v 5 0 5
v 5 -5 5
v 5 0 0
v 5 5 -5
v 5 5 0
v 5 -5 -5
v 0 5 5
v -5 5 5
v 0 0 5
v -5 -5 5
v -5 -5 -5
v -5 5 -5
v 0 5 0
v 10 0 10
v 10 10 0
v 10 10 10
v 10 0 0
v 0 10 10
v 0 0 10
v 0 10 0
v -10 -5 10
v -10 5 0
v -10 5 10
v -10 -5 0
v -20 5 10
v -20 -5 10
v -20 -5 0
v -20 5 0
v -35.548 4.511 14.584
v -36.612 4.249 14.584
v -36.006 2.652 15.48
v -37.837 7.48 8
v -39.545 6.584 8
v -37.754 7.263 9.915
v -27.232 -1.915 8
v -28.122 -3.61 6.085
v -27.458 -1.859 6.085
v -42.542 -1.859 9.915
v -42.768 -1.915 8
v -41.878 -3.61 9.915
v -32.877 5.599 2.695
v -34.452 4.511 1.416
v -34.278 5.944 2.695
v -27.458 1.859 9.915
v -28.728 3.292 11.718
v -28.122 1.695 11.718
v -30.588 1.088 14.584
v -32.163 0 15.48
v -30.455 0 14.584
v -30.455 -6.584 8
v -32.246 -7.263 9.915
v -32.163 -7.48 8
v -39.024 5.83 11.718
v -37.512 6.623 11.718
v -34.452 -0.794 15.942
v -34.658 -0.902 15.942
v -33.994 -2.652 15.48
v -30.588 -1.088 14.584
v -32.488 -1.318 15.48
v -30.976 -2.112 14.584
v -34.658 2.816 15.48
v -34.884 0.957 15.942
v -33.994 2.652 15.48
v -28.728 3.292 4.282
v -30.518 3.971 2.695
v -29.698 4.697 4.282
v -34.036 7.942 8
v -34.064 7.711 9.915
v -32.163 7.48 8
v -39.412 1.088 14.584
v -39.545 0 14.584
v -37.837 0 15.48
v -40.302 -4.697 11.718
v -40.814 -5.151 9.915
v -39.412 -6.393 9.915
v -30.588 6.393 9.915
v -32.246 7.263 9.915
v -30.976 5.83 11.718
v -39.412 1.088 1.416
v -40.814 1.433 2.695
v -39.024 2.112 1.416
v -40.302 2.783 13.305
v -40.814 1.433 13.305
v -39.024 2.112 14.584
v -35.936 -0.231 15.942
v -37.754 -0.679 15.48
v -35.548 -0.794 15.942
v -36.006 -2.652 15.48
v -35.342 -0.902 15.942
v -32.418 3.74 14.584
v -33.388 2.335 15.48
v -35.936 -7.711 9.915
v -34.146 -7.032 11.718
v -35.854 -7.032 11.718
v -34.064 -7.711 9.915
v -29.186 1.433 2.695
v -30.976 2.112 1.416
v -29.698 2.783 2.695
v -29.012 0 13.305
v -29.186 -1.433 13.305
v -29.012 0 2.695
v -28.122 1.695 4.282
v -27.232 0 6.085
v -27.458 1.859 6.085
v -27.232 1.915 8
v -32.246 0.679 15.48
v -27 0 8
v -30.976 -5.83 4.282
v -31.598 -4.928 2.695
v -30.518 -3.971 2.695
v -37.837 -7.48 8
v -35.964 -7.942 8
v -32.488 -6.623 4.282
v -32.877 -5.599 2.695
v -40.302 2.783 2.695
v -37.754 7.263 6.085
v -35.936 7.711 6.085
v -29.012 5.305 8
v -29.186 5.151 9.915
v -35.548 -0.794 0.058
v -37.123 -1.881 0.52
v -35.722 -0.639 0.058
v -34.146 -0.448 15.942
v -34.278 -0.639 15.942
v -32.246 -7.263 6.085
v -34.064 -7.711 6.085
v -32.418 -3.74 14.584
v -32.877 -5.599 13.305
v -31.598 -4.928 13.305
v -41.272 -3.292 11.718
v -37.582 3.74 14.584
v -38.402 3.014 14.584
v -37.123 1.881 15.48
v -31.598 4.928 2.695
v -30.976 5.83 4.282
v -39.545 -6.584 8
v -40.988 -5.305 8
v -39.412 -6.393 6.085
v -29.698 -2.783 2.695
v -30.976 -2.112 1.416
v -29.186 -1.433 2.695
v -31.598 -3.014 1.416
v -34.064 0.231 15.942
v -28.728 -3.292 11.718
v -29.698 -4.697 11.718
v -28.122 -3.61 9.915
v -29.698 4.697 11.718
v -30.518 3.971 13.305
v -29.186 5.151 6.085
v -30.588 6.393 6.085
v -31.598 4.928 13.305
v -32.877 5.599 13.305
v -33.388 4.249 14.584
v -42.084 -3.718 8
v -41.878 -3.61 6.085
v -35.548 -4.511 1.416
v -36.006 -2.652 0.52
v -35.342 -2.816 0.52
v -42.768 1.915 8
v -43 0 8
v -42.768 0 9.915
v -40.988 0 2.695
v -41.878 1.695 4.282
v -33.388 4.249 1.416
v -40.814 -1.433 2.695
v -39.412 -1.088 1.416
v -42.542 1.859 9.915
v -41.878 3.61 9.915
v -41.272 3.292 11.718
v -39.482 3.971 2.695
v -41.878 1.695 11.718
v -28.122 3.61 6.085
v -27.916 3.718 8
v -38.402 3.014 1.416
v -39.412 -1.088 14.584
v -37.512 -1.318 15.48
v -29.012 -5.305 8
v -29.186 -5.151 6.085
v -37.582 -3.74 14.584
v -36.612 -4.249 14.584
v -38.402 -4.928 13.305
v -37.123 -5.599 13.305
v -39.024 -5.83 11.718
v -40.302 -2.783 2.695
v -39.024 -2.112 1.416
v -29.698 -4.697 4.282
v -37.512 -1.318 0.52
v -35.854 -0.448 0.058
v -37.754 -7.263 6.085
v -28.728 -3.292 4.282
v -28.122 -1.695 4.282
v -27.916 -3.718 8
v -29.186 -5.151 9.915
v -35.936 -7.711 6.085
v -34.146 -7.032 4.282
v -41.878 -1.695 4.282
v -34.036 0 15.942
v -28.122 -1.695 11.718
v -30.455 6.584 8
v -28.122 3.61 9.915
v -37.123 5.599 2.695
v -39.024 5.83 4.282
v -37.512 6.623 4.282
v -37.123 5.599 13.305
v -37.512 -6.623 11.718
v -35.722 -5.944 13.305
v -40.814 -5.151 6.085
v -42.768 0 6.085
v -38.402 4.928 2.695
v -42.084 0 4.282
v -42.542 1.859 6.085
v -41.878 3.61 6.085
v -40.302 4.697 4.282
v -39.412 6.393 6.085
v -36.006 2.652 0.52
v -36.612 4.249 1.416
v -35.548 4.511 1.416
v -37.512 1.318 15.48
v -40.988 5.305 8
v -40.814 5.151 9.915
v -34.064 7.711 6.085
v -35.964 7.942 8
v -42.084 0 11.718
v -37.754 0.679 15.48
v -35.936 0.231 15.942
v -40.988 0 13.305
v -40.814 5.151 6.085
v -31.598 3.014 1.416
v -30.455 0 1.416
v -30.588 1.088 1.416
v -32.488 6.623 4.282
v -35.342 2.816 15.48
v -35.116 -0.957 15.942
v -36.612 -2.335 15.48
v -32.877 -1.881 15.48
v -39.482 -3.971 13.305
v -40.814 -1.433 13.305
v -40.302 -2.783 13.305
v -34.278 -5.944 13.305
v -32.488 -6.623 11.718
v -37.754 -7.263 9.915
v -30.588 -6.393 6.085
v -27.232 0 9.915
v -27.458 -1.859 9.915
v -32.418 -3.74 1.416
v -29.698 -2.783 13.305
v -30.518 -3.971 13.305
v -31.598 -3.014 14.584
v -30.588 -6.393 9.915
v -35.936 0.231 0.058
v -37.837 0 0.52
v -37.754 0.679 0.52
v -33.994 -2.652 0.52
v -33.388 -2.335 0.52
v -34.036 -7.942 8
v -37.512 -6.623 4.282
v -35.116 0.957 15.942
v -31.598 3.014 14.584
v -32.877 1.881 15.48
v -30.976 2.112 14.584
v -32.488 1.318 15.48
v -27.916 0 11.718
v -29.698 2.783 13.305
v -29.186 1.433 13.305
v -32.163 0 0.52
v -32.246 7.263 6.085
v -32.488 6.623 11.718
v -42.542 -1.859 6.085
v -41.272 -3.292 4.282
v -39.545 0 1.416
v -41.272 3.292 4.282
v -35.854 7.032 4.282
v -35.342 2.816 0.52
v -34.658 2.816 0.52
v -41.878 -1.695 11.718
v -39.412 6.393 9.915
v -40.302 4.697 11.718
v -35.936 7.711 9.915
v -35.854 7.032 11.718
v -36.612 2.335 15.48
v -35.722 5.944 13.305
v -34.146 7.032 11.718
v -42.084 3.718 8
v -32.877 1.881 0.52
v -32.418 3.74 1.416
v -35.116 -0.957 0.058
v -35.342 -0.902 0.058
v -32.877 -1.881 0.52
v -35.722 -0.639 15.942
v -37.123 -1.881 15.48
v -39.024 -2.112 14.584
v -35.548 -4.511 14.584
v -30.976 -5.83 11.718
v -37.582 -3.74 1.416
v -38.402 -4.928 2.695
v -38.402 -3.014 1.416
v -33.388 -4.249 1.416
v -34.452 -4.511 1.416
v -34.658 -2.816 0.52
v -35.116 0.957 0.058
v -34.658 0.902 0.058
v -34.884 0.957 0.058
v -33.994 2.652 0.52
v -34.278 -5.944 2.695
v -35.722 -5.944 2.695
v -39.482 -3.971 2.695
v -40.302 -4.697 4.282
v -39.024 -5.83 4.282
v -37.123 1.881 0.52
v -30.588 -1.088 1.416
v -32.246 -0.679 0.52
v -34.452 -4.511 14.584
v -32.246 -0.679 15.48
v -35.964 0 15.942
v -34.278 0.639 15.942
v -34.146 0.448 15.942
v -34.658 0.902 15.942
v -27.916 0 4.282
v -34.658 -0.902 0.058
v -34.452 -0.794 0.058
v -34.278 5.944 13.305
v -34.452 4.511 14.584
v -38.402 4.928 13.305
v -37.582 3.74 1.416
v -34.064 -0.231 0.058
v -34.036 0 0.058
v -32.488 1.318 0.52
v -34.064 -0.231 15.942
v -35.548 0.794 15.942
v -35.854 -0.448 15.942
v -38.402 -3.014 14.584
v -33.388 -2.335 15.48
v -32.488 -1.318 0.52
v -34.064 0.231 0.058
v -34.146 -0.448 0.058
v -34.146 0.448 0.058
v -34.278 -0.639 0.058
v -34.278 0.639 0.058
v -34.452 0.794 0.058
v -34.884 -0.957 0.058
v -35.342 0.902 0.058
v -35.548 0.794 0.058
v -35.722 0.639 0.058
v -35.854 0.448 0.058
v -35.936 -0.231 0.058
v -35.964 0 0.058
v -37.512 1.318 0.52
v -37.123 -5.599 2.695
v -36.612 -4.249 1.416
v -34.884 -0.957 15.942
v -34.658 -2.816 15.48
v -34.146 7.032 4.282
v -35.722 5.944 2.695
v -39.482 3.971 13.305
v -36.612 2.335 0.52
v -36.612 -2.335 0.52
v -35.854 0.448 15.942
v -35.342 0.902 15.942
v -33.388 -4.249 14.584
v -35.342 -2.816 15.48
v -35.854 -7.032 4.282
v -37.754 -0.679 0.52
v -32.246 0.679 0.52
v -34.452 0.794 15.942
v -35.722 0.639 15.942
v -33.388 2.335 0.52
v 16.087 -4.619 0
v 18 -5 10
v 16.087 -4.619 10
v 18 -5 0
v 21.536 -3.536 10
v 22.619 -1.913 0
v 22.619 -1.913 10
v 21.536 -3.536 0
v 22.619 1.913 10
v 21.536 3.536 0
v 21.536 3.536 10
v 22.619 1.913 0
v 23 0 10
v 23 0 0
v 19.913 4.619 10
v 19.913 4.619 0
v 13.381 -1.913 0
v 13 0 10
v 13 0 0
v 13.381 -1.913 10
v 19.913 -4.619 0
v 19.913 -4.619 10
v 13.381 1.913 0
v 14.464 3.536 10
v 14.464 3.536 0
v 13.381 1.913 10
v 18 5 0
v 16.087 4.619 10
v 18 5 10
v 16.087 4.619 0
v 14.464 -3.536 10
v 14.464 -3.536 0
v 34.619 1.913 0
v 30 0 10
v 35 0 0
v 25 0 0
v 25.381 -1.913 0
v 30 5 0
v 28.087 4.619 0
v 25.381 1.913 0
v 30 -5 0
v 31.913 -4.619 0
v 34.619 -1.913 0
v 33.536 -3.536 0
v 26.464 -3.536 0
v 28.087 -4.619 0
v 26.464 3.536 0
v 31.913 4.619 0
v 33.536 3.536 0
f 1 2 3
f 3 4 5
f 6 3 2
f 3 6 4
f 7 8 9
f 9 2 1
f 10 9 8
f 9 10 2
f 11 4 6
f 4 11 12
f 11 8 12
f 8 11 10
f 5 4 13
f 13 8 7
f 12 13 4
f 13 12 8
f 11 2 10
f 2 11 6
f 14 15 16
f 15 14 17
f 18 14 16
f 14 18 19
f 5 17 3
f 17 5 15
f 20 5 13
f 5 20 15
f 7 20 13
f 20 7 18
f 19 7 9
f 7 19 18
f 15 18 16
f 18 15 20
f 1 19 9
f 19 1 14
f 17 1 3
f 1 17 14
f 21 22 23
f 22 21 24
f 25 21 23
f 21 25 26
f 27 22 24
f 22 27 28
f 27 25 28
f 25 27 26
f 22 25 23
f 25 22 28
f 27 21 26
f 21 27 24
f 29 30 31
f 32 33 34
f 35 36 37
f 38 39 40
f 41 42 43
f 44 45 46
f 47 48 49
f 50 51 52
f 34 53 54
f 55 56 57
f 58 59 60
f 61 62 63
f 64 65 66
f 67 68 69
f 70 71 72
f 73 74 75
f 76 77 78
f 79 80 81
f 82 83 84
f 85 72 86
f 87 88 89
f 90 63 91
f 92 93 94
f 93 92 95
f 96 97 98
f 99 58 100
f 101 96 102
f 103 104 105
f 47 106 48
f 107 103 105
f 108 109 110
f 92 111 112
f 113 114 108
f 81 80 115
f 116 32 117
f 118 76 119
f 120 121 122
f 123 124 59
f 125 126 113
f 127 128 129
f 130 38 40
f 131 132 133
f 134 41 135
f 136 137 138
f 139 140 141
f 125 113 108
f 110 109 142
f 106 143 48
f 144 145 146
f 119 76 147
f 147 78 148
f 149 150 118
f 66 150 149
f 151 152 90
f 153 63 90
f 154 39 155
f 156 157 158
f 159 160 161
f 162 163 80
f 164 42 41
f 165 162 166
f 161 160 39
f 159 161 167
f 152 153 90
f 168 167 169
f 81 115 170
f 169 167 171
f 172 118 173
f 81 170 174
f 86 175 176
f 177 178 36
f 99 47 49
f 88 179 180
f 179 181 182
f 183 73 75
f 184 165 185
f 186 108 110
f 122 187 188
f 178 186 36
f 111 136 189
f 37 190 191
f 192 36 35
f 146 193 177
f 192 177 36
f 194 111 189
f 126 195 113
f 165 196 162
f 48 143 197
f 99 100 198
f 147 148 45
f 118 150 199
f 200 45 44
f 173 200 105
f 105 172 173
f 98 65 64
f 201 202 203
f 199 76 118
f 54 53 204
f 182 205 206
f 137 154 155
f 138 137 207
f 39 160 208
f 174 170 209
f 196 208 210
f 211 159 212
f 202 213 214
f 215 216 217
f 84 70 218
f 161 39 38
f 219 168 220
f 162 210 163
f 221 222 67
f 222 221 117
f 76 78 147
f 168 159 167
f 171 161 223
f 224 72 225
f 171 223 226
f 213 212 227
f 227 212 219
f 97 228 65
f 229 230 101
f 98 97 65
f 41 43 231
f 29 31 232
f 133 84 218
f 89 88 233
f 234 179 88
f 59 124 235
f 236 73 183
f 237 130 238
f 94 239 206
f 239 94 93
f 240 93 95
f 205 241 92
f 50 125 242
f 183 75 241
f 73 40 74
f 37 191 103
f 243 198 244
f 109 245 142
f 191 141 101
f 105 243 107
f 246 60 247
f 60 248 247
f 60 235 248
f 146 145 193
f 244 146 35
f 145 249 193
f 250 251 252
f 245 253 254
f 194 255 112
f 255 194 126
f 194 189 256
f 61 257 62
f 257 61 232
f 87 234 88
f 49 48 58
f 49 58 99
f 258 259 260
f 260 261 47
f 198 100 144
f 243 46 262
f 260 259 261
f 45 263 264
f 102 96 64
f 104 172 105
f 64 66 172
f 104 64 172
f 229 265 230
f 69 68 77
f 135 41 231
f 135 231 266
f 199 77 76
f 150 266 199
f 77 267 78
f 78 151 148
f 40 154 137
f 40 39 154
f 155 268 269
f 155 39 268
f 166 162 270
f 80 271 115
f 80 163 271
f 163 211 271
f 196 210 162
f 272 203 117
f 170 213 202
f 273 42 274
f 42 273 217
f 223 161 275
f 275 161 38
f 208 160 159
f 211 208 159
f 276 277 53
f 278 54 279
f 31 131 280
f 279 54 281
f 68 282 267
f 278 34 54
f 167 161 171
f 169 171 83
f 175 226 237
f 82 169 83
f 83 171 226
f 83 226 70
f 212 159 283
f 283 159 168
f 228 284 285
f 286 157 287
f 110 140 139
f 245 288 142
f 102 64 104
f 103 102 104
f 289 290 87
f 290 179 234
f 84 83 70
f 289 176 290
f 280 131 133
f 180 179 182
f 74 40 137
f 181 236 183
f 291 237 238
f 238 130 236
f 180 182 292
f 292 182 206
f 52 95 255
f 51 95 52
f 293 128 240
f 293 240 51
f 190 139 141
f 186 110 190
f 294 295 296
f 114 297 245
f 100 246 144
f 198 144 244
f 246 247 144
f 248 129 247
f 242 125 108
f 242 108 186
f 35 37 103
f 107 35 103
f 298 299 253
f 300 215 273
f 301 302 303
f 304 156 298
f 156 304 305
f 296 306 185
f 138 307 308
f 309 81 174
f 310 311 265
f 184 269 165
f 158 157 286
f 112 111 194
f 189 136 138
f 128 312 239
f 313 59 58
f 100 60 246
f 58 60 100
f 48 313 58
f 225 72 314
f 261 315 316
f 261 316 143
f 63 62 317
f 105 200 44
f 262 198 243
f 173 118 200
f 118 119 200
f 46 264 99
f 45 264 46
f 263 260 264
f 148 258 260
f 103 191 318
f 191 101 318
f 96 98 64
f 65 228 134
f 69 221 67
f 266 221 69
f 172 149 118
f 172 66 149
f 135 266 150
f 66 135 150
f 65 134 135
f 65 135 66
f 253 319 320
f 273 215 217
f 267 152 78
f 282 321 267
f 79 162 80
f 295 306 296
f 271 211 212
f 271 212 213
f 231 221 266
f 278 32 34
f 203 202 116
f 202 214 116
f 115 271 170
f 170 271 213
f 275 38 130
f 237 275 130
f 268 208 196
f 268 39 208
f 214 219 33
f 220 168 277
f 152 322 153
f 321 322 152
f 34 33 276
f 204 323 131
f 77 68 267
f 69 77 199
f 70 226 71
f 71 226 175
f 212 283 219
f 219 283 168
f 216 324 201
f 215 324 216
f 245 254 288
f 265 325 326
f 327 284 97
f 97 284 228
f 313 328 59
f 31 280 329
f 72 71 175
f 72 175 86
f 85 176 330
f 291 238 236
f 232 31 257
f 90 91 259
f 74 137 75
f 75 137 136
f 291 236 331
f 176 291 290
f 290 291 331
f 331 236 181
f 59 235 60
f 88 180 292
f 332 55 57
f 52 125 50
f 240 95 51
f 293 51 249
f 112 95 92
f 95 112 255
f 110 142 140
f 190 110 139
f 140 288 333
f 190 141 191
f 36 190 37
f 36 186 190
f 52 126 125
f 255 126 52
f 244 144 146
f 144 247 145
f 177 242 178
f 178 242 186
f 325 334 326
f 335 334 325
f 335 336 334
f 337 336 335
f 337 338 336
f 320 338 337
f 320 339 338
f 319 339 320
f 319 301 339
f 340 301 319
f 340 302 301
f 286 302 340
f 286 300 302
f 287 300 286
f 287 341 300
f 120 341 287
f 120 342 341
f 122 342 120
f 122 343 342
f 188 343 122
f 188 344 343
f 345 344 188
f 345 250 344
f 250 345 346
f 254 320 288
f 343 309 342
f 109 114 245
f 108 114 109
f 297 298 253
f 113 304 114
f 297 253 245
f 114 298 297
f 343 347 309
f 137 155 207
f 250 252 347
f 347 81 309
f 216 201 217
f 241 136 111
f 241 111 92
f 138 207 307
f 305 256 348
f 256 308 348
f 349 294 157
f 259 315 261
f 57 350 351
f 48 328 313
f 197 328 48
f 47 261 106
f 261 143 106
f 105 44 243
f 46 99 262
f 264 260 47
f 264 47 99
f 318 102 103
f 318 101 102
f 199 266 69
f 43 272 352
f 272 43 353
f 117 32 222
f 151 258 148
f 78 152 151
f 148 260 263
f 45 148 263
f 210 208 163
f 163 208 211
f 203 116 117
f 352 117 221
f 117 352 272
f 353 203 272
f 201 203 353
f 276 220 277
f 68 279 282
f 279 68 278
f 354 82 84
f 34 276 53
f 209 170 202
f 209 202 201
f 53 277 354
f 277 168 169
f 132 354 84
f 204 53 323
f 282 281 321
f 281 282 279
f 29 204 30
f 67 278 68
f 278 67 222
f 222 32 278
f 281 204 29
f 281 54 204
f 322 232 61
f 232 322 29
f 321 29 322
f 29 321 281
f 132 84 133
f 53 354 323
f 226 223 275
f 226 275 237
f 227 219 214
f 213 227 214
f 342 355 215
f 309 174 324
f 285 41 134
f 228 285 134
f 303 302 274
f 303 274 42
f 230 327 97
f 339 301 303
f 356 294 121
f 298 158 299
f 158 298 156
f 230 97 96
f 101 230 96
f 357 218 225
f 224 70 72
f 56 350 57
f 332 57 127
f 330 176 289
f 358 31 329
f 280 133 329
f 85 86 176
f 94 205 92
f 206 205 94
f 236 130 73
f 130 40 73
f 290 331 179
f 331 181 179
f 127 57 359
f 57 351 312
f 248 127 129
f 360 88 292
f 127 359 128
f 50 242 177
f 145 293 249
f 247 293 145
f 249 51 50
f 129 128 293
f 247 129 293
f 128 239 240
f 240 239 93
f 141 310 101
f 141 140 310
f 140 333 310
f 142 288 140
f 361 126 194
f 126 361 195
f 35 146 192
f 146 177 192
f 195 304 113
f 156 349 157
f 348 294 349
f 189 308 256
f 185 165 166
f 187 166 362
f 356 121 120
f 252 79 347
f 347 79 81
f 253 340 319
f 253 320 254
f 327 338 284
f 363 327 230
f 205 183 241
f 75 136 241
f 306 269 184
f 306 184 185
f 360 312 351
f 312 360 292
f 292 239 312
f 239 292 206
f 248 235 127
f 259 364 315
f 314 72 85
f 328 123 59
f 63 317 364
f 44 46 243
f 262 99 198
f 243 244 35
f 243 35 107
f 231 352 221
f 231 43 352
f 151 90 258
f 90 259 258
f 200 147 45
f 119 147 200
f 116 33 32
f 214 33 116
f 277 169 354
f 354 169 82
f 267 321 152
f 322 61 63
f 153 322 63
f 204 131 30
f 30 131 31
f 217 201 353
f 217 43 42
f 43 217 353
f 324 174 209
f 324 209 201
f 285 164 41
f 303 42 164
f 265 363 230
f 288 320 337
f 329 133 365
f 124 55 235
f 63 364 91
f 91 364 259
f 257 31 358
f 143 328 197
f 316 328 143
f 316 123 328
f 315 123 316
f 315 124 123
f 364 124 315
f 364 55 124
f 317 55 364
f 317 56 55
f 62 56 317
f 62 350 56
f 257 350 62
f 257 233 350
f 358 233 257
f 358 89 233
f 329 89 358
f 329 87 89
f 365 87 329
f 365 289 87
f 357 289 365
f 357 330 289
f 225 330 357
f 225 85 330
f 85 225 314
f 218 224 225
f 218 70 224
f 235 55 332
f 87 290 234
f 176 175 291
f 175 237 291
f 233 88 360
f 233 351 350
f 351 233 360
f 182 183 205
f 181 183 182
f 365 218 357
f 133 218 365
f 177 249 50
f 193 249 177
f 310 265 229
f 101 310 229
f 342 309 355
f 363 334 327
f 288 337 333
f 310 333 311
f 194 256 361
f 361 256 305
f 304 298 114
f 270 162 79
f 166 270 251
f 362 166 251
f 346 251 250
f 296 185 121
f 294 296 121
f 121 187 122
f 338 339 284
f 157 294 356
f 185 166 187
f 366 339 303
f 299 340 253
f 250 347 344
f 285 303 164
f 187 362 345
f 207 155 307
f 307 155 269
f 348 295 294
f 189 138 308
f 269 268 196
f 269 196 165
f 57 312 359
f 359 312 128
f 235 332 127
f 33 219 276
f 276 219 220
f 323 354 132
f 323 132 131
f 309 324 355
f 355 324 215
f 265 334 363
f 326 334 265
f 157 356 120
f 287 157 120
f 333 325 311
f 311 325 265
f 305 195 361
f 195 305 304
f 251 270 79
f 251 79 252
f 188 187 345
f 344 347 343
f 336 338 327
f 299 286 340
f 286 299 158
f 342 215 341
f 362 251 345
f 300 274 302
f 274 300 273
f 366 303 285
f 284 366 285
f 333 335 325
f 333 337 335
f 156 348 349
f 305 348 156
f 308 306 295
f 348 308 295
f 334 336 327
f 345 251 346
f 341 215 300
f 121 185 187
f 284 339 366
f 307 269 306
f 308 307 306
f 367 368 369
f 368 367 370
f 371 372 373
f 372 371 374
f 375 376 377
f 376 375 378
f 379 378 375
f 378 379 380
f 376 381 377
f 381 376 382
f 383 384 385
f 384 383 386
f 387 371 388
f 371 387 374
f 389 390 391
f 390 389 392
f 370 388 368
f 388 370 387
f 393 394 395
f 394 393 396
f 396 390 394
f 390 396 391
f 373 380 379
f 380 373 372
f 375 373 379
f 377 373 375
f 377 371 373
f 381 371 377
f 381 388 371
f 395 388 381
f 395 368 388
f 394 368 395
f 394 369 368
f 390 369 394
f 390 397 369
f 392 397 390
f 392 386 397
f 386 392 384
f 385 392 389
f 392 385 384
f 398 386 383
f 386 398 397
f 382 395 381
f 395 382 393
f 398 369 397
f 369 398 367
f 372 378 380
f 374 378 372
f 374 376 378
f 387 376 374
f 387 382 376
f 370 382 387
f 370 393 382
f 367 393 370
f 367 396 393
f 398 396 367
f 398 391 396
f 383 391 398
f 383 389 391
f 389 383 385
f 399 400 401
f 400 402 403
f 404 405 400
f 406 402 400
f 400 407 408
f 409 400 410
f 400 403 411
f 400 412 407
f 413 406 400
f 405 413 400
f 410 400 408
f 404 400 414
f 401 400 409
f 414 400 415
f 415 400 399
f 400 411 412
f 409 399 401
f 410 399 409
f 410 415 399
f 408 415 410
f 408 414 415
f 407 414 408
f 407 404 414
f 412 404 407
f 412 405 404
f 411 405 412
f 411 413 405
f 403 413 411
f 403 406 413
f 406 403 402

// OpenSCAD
// OpenSCAD shapes

/*
 * Cubes can be centered at (0,0,0) with "center=true".
 * The volume of the cube will go from (-5,-5,-5)
 * to (5,5,5)
 */
color("green") cube([10,10,10], center=true);

/*
 * without "center=true", the cube will have its
 * corner at (0,0,0) and (10,10,10)
 */
color("red") cube([10,10,10]);


/*
 * translate() moves its children in the current
 * reference frame. To move the centered box to the
 * "ground", we need to translate it in +Z by half
 * the height.  We also move it in -X to clear
 * the other shapes.
 */
translate([-15,0,10/2]) cube([10,10,10], center=true);


/*
 * Sphere takes one argument, the radius.
 */
translate([-35,0,8]) sphere(r=8);



/*
 * cylinder can take two arguments: radius and height
 * Note that the cylinder is centered at (0,0,0)
 * goes to (0,0,h)
 */
translate([18,0,0]) cylinder(r=5, h=10);


/*
 * cylinder can also take three arguments,
 * r1, r2 and the height to make a cone.
 */
translate([30,0,0]) cylinder(r1=5, r2=0, h=10);



/*
 * The OpenSCAD % modifier makes a semi-transparent
 * object.  This is useful to indicate the "ground"
 * or other references for debugging.  They will not
 * appear in the STL output for printing.
 */
%translate([0,0,-1/2]) cube([100,50,1], center=true);
